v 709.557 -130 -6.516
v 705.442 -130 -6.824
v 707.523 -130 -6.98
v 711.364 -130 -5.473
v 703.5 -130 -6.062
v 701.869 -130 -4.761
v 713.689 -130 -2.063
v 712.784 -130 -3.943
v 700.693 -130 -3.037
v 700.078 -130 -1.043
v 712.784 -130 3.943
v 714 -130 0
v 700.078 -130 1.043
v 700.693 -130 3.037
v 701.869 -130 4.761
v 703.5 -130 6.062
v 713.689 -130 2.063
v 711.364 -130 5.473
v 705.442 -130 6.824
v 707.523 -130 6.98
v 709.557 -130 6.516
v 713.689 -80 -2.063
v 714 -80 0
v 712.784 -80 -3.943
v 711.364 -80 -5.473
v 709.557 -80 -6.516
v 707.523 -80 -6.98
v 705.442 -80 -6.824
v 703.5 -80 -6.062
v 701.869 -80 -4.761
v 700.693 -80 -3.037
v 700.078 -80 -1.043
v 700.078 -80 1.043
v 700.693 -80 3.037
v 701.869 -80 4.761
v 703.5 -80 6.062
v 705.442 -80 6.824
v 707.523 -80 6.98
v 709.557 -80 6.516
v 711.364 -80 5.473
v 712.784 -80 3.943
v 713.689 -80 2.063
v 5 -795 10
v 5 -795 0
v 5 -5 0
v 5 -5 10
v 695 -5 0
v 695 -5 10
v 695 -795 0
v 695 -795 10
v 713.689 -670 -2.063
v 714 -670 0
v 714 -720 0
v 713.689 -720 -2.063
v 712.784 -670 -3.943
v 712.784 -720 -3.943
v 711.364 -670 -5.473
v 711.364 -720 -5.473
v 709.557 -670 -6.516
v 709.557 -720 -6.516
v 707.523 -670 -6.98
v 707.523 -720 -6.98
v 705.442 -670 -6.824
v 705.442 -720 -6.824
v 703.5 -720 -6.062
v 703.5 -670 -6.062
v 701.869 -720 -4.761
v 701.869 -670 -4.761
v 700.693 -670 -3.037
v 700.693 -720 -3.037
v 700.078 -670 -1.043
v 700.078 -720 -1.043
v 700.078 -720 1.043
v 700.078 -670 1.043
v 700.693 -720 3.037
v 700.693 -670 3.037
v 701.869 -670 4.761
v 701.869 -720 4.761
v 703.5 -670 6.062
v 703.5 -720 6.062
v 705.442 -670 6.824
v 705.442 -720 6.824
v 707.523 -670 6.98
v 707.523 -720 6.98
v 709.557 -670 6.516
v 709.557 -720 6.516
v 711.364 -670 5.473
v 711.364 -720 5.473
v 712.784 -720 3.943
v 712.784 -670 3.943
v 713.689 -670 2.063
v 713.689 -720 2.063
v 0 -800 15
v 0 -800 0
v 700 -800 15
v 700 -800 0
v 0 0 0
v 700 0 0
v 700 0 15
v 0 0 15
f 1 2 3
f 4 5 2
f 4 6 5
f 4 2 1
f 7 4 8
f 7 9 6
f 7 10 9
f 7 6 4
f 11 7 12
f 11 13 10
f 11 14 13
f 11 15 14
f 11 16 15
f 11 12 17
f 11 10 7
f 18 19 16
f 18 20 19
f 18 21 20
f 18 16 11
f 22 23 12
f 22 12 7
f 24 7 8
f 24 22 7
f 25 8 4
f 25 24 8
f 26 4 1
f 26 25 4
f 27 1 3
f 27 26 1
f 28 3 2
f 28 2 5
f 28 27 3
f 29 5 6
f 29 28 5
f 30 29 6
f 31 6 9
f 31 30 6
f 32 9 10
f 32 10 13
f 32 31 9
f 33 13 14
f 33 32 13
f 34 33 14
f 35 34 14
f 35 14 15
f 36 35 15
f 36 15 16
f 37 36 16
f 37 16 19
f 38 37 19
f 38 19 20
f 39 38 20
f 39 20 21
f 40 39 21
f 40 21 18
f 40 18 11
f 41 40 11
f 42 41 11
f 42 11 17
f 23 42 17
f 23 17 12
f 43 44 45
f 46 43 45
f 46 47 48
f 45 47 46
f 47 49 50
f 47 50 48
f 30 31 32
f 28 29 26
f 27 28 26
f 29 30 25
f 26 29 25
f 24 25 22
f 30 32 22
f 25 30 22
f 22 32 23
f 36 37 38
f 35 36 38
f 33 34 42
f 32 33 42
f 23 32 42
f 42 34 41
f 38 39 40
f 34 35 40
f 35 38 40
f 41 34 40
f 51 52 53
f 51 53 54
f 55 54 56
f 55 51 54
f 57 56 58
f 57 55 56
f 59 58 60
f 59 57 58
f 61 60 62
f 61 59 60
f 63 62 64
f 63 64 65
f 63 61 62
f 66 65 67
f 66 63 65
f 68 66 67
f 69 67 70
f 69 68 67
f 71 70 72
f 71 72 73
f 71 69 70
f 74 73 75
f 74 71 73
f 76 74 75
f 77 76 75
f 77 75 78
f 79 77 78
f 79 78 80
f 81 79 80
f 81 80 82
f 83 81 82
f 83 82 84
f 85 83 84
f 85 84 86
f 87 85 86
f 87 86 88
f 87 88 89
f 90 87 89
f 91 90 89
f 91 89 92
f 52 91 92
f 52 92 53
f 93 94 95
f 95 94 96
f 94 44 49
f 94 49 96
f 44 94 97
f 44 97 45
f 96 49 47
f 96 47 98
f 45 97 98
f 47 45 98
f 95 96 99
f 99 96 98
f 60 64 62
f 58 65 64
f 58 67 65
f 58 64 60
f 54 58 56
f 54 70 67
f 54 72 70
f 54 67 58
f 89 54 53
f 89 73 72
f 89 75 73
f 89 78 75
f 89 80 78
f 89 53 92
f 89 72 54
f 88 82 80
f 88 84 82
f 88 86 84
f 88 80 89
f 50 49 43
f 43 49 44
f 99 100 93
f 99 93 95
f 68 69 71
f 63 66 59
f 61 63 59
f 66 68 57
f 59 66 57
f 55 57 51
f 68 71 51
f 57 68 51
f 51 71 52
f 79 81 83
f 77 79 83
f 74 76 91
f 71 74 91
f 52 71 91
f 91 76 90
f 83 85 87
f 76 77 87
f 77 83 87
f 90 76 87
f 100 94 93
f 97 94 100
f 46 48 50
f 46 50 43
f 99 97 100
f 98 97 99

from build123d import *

# Parameters (mm, degrees)
CROQUIS1_W              = 700
CROQUIS1_H              = 800
SALIENTE_EXTRUIR1_DEPTH = 15
CROQUIS2_W              = 690
CROQUIS2_H              = 790
CORTAR_EXTRUIR1_DEPTH   = 10
CROQUIS4_R              = 7
SALIENTE_EXTRUIR2_DEPTH = 800
CROQUIS5_W              = 52.334902761
CROQUIS5_H              = 80
CROQUIS5_H_2            = 540
CORTAR_EXTRUIR2_DEPTH   = 25


with BuildPart() as part:
    # Croquis1 → Saliente-Extruir1 (new body)
    with BuildSketch(Plane.XY):
        with Locations((350, -400)):
            Rectangle(CROQUIS1_W, CROQUIS1_H)
    extrude(amount=SALIENTE_EXTRUIR1_DEPTH)

    # Croquis2 → Cortar-Extruir1 (cut)
    with BuildSketch(Plane(origin=(0, 0, 0), x_dir=(-1, 0, 0), z_dir=(0, 0, -1))):
        with Locations((-350, -400)):
            Rectangle(CROQUIS2_W, CROQUIS2_H)
    extrude(amount=-CORTAR_EXTRUIR1_DEPTH, mode=Mode.SUBTRACT)


with BuildPart() as body_2:
    # Croquis4 → Saliente-Extruir2 (new body)
    with BuildSketch(Plane(origin=(0, 0, 0), x_dir=(1, 0, 0), z_dir=(0, 1, 0))):
        with Locations((707, 0)):
            Circle(CROQUIS4_R)
    extrude(amount=-SALIENTE_EXTRUIR2_DEPTH)

    # Croquis5 → Cortar-Extruir2 (cut)
    with BuildSketch(Plane.XY.offset(15)):
        with Locations((726.167451381, -40)):
            Rectangle(CROQUIS5_W, CROQUIS5_H)
        with Locations((726.167451381, -760)):
            Rectangle(CROQUIS5_W, CROQUIS5_H)
        with Locations((726.167451381, -400)):
            Rectangle(CROQUIS5_W, CROQUIS5_H_2)
    extrude(amount=-CORTAR_EXTRUIR2_DEPTH, mode=Mode.SUBTRACT)


solid = Compound([part.part, body_2.part])
